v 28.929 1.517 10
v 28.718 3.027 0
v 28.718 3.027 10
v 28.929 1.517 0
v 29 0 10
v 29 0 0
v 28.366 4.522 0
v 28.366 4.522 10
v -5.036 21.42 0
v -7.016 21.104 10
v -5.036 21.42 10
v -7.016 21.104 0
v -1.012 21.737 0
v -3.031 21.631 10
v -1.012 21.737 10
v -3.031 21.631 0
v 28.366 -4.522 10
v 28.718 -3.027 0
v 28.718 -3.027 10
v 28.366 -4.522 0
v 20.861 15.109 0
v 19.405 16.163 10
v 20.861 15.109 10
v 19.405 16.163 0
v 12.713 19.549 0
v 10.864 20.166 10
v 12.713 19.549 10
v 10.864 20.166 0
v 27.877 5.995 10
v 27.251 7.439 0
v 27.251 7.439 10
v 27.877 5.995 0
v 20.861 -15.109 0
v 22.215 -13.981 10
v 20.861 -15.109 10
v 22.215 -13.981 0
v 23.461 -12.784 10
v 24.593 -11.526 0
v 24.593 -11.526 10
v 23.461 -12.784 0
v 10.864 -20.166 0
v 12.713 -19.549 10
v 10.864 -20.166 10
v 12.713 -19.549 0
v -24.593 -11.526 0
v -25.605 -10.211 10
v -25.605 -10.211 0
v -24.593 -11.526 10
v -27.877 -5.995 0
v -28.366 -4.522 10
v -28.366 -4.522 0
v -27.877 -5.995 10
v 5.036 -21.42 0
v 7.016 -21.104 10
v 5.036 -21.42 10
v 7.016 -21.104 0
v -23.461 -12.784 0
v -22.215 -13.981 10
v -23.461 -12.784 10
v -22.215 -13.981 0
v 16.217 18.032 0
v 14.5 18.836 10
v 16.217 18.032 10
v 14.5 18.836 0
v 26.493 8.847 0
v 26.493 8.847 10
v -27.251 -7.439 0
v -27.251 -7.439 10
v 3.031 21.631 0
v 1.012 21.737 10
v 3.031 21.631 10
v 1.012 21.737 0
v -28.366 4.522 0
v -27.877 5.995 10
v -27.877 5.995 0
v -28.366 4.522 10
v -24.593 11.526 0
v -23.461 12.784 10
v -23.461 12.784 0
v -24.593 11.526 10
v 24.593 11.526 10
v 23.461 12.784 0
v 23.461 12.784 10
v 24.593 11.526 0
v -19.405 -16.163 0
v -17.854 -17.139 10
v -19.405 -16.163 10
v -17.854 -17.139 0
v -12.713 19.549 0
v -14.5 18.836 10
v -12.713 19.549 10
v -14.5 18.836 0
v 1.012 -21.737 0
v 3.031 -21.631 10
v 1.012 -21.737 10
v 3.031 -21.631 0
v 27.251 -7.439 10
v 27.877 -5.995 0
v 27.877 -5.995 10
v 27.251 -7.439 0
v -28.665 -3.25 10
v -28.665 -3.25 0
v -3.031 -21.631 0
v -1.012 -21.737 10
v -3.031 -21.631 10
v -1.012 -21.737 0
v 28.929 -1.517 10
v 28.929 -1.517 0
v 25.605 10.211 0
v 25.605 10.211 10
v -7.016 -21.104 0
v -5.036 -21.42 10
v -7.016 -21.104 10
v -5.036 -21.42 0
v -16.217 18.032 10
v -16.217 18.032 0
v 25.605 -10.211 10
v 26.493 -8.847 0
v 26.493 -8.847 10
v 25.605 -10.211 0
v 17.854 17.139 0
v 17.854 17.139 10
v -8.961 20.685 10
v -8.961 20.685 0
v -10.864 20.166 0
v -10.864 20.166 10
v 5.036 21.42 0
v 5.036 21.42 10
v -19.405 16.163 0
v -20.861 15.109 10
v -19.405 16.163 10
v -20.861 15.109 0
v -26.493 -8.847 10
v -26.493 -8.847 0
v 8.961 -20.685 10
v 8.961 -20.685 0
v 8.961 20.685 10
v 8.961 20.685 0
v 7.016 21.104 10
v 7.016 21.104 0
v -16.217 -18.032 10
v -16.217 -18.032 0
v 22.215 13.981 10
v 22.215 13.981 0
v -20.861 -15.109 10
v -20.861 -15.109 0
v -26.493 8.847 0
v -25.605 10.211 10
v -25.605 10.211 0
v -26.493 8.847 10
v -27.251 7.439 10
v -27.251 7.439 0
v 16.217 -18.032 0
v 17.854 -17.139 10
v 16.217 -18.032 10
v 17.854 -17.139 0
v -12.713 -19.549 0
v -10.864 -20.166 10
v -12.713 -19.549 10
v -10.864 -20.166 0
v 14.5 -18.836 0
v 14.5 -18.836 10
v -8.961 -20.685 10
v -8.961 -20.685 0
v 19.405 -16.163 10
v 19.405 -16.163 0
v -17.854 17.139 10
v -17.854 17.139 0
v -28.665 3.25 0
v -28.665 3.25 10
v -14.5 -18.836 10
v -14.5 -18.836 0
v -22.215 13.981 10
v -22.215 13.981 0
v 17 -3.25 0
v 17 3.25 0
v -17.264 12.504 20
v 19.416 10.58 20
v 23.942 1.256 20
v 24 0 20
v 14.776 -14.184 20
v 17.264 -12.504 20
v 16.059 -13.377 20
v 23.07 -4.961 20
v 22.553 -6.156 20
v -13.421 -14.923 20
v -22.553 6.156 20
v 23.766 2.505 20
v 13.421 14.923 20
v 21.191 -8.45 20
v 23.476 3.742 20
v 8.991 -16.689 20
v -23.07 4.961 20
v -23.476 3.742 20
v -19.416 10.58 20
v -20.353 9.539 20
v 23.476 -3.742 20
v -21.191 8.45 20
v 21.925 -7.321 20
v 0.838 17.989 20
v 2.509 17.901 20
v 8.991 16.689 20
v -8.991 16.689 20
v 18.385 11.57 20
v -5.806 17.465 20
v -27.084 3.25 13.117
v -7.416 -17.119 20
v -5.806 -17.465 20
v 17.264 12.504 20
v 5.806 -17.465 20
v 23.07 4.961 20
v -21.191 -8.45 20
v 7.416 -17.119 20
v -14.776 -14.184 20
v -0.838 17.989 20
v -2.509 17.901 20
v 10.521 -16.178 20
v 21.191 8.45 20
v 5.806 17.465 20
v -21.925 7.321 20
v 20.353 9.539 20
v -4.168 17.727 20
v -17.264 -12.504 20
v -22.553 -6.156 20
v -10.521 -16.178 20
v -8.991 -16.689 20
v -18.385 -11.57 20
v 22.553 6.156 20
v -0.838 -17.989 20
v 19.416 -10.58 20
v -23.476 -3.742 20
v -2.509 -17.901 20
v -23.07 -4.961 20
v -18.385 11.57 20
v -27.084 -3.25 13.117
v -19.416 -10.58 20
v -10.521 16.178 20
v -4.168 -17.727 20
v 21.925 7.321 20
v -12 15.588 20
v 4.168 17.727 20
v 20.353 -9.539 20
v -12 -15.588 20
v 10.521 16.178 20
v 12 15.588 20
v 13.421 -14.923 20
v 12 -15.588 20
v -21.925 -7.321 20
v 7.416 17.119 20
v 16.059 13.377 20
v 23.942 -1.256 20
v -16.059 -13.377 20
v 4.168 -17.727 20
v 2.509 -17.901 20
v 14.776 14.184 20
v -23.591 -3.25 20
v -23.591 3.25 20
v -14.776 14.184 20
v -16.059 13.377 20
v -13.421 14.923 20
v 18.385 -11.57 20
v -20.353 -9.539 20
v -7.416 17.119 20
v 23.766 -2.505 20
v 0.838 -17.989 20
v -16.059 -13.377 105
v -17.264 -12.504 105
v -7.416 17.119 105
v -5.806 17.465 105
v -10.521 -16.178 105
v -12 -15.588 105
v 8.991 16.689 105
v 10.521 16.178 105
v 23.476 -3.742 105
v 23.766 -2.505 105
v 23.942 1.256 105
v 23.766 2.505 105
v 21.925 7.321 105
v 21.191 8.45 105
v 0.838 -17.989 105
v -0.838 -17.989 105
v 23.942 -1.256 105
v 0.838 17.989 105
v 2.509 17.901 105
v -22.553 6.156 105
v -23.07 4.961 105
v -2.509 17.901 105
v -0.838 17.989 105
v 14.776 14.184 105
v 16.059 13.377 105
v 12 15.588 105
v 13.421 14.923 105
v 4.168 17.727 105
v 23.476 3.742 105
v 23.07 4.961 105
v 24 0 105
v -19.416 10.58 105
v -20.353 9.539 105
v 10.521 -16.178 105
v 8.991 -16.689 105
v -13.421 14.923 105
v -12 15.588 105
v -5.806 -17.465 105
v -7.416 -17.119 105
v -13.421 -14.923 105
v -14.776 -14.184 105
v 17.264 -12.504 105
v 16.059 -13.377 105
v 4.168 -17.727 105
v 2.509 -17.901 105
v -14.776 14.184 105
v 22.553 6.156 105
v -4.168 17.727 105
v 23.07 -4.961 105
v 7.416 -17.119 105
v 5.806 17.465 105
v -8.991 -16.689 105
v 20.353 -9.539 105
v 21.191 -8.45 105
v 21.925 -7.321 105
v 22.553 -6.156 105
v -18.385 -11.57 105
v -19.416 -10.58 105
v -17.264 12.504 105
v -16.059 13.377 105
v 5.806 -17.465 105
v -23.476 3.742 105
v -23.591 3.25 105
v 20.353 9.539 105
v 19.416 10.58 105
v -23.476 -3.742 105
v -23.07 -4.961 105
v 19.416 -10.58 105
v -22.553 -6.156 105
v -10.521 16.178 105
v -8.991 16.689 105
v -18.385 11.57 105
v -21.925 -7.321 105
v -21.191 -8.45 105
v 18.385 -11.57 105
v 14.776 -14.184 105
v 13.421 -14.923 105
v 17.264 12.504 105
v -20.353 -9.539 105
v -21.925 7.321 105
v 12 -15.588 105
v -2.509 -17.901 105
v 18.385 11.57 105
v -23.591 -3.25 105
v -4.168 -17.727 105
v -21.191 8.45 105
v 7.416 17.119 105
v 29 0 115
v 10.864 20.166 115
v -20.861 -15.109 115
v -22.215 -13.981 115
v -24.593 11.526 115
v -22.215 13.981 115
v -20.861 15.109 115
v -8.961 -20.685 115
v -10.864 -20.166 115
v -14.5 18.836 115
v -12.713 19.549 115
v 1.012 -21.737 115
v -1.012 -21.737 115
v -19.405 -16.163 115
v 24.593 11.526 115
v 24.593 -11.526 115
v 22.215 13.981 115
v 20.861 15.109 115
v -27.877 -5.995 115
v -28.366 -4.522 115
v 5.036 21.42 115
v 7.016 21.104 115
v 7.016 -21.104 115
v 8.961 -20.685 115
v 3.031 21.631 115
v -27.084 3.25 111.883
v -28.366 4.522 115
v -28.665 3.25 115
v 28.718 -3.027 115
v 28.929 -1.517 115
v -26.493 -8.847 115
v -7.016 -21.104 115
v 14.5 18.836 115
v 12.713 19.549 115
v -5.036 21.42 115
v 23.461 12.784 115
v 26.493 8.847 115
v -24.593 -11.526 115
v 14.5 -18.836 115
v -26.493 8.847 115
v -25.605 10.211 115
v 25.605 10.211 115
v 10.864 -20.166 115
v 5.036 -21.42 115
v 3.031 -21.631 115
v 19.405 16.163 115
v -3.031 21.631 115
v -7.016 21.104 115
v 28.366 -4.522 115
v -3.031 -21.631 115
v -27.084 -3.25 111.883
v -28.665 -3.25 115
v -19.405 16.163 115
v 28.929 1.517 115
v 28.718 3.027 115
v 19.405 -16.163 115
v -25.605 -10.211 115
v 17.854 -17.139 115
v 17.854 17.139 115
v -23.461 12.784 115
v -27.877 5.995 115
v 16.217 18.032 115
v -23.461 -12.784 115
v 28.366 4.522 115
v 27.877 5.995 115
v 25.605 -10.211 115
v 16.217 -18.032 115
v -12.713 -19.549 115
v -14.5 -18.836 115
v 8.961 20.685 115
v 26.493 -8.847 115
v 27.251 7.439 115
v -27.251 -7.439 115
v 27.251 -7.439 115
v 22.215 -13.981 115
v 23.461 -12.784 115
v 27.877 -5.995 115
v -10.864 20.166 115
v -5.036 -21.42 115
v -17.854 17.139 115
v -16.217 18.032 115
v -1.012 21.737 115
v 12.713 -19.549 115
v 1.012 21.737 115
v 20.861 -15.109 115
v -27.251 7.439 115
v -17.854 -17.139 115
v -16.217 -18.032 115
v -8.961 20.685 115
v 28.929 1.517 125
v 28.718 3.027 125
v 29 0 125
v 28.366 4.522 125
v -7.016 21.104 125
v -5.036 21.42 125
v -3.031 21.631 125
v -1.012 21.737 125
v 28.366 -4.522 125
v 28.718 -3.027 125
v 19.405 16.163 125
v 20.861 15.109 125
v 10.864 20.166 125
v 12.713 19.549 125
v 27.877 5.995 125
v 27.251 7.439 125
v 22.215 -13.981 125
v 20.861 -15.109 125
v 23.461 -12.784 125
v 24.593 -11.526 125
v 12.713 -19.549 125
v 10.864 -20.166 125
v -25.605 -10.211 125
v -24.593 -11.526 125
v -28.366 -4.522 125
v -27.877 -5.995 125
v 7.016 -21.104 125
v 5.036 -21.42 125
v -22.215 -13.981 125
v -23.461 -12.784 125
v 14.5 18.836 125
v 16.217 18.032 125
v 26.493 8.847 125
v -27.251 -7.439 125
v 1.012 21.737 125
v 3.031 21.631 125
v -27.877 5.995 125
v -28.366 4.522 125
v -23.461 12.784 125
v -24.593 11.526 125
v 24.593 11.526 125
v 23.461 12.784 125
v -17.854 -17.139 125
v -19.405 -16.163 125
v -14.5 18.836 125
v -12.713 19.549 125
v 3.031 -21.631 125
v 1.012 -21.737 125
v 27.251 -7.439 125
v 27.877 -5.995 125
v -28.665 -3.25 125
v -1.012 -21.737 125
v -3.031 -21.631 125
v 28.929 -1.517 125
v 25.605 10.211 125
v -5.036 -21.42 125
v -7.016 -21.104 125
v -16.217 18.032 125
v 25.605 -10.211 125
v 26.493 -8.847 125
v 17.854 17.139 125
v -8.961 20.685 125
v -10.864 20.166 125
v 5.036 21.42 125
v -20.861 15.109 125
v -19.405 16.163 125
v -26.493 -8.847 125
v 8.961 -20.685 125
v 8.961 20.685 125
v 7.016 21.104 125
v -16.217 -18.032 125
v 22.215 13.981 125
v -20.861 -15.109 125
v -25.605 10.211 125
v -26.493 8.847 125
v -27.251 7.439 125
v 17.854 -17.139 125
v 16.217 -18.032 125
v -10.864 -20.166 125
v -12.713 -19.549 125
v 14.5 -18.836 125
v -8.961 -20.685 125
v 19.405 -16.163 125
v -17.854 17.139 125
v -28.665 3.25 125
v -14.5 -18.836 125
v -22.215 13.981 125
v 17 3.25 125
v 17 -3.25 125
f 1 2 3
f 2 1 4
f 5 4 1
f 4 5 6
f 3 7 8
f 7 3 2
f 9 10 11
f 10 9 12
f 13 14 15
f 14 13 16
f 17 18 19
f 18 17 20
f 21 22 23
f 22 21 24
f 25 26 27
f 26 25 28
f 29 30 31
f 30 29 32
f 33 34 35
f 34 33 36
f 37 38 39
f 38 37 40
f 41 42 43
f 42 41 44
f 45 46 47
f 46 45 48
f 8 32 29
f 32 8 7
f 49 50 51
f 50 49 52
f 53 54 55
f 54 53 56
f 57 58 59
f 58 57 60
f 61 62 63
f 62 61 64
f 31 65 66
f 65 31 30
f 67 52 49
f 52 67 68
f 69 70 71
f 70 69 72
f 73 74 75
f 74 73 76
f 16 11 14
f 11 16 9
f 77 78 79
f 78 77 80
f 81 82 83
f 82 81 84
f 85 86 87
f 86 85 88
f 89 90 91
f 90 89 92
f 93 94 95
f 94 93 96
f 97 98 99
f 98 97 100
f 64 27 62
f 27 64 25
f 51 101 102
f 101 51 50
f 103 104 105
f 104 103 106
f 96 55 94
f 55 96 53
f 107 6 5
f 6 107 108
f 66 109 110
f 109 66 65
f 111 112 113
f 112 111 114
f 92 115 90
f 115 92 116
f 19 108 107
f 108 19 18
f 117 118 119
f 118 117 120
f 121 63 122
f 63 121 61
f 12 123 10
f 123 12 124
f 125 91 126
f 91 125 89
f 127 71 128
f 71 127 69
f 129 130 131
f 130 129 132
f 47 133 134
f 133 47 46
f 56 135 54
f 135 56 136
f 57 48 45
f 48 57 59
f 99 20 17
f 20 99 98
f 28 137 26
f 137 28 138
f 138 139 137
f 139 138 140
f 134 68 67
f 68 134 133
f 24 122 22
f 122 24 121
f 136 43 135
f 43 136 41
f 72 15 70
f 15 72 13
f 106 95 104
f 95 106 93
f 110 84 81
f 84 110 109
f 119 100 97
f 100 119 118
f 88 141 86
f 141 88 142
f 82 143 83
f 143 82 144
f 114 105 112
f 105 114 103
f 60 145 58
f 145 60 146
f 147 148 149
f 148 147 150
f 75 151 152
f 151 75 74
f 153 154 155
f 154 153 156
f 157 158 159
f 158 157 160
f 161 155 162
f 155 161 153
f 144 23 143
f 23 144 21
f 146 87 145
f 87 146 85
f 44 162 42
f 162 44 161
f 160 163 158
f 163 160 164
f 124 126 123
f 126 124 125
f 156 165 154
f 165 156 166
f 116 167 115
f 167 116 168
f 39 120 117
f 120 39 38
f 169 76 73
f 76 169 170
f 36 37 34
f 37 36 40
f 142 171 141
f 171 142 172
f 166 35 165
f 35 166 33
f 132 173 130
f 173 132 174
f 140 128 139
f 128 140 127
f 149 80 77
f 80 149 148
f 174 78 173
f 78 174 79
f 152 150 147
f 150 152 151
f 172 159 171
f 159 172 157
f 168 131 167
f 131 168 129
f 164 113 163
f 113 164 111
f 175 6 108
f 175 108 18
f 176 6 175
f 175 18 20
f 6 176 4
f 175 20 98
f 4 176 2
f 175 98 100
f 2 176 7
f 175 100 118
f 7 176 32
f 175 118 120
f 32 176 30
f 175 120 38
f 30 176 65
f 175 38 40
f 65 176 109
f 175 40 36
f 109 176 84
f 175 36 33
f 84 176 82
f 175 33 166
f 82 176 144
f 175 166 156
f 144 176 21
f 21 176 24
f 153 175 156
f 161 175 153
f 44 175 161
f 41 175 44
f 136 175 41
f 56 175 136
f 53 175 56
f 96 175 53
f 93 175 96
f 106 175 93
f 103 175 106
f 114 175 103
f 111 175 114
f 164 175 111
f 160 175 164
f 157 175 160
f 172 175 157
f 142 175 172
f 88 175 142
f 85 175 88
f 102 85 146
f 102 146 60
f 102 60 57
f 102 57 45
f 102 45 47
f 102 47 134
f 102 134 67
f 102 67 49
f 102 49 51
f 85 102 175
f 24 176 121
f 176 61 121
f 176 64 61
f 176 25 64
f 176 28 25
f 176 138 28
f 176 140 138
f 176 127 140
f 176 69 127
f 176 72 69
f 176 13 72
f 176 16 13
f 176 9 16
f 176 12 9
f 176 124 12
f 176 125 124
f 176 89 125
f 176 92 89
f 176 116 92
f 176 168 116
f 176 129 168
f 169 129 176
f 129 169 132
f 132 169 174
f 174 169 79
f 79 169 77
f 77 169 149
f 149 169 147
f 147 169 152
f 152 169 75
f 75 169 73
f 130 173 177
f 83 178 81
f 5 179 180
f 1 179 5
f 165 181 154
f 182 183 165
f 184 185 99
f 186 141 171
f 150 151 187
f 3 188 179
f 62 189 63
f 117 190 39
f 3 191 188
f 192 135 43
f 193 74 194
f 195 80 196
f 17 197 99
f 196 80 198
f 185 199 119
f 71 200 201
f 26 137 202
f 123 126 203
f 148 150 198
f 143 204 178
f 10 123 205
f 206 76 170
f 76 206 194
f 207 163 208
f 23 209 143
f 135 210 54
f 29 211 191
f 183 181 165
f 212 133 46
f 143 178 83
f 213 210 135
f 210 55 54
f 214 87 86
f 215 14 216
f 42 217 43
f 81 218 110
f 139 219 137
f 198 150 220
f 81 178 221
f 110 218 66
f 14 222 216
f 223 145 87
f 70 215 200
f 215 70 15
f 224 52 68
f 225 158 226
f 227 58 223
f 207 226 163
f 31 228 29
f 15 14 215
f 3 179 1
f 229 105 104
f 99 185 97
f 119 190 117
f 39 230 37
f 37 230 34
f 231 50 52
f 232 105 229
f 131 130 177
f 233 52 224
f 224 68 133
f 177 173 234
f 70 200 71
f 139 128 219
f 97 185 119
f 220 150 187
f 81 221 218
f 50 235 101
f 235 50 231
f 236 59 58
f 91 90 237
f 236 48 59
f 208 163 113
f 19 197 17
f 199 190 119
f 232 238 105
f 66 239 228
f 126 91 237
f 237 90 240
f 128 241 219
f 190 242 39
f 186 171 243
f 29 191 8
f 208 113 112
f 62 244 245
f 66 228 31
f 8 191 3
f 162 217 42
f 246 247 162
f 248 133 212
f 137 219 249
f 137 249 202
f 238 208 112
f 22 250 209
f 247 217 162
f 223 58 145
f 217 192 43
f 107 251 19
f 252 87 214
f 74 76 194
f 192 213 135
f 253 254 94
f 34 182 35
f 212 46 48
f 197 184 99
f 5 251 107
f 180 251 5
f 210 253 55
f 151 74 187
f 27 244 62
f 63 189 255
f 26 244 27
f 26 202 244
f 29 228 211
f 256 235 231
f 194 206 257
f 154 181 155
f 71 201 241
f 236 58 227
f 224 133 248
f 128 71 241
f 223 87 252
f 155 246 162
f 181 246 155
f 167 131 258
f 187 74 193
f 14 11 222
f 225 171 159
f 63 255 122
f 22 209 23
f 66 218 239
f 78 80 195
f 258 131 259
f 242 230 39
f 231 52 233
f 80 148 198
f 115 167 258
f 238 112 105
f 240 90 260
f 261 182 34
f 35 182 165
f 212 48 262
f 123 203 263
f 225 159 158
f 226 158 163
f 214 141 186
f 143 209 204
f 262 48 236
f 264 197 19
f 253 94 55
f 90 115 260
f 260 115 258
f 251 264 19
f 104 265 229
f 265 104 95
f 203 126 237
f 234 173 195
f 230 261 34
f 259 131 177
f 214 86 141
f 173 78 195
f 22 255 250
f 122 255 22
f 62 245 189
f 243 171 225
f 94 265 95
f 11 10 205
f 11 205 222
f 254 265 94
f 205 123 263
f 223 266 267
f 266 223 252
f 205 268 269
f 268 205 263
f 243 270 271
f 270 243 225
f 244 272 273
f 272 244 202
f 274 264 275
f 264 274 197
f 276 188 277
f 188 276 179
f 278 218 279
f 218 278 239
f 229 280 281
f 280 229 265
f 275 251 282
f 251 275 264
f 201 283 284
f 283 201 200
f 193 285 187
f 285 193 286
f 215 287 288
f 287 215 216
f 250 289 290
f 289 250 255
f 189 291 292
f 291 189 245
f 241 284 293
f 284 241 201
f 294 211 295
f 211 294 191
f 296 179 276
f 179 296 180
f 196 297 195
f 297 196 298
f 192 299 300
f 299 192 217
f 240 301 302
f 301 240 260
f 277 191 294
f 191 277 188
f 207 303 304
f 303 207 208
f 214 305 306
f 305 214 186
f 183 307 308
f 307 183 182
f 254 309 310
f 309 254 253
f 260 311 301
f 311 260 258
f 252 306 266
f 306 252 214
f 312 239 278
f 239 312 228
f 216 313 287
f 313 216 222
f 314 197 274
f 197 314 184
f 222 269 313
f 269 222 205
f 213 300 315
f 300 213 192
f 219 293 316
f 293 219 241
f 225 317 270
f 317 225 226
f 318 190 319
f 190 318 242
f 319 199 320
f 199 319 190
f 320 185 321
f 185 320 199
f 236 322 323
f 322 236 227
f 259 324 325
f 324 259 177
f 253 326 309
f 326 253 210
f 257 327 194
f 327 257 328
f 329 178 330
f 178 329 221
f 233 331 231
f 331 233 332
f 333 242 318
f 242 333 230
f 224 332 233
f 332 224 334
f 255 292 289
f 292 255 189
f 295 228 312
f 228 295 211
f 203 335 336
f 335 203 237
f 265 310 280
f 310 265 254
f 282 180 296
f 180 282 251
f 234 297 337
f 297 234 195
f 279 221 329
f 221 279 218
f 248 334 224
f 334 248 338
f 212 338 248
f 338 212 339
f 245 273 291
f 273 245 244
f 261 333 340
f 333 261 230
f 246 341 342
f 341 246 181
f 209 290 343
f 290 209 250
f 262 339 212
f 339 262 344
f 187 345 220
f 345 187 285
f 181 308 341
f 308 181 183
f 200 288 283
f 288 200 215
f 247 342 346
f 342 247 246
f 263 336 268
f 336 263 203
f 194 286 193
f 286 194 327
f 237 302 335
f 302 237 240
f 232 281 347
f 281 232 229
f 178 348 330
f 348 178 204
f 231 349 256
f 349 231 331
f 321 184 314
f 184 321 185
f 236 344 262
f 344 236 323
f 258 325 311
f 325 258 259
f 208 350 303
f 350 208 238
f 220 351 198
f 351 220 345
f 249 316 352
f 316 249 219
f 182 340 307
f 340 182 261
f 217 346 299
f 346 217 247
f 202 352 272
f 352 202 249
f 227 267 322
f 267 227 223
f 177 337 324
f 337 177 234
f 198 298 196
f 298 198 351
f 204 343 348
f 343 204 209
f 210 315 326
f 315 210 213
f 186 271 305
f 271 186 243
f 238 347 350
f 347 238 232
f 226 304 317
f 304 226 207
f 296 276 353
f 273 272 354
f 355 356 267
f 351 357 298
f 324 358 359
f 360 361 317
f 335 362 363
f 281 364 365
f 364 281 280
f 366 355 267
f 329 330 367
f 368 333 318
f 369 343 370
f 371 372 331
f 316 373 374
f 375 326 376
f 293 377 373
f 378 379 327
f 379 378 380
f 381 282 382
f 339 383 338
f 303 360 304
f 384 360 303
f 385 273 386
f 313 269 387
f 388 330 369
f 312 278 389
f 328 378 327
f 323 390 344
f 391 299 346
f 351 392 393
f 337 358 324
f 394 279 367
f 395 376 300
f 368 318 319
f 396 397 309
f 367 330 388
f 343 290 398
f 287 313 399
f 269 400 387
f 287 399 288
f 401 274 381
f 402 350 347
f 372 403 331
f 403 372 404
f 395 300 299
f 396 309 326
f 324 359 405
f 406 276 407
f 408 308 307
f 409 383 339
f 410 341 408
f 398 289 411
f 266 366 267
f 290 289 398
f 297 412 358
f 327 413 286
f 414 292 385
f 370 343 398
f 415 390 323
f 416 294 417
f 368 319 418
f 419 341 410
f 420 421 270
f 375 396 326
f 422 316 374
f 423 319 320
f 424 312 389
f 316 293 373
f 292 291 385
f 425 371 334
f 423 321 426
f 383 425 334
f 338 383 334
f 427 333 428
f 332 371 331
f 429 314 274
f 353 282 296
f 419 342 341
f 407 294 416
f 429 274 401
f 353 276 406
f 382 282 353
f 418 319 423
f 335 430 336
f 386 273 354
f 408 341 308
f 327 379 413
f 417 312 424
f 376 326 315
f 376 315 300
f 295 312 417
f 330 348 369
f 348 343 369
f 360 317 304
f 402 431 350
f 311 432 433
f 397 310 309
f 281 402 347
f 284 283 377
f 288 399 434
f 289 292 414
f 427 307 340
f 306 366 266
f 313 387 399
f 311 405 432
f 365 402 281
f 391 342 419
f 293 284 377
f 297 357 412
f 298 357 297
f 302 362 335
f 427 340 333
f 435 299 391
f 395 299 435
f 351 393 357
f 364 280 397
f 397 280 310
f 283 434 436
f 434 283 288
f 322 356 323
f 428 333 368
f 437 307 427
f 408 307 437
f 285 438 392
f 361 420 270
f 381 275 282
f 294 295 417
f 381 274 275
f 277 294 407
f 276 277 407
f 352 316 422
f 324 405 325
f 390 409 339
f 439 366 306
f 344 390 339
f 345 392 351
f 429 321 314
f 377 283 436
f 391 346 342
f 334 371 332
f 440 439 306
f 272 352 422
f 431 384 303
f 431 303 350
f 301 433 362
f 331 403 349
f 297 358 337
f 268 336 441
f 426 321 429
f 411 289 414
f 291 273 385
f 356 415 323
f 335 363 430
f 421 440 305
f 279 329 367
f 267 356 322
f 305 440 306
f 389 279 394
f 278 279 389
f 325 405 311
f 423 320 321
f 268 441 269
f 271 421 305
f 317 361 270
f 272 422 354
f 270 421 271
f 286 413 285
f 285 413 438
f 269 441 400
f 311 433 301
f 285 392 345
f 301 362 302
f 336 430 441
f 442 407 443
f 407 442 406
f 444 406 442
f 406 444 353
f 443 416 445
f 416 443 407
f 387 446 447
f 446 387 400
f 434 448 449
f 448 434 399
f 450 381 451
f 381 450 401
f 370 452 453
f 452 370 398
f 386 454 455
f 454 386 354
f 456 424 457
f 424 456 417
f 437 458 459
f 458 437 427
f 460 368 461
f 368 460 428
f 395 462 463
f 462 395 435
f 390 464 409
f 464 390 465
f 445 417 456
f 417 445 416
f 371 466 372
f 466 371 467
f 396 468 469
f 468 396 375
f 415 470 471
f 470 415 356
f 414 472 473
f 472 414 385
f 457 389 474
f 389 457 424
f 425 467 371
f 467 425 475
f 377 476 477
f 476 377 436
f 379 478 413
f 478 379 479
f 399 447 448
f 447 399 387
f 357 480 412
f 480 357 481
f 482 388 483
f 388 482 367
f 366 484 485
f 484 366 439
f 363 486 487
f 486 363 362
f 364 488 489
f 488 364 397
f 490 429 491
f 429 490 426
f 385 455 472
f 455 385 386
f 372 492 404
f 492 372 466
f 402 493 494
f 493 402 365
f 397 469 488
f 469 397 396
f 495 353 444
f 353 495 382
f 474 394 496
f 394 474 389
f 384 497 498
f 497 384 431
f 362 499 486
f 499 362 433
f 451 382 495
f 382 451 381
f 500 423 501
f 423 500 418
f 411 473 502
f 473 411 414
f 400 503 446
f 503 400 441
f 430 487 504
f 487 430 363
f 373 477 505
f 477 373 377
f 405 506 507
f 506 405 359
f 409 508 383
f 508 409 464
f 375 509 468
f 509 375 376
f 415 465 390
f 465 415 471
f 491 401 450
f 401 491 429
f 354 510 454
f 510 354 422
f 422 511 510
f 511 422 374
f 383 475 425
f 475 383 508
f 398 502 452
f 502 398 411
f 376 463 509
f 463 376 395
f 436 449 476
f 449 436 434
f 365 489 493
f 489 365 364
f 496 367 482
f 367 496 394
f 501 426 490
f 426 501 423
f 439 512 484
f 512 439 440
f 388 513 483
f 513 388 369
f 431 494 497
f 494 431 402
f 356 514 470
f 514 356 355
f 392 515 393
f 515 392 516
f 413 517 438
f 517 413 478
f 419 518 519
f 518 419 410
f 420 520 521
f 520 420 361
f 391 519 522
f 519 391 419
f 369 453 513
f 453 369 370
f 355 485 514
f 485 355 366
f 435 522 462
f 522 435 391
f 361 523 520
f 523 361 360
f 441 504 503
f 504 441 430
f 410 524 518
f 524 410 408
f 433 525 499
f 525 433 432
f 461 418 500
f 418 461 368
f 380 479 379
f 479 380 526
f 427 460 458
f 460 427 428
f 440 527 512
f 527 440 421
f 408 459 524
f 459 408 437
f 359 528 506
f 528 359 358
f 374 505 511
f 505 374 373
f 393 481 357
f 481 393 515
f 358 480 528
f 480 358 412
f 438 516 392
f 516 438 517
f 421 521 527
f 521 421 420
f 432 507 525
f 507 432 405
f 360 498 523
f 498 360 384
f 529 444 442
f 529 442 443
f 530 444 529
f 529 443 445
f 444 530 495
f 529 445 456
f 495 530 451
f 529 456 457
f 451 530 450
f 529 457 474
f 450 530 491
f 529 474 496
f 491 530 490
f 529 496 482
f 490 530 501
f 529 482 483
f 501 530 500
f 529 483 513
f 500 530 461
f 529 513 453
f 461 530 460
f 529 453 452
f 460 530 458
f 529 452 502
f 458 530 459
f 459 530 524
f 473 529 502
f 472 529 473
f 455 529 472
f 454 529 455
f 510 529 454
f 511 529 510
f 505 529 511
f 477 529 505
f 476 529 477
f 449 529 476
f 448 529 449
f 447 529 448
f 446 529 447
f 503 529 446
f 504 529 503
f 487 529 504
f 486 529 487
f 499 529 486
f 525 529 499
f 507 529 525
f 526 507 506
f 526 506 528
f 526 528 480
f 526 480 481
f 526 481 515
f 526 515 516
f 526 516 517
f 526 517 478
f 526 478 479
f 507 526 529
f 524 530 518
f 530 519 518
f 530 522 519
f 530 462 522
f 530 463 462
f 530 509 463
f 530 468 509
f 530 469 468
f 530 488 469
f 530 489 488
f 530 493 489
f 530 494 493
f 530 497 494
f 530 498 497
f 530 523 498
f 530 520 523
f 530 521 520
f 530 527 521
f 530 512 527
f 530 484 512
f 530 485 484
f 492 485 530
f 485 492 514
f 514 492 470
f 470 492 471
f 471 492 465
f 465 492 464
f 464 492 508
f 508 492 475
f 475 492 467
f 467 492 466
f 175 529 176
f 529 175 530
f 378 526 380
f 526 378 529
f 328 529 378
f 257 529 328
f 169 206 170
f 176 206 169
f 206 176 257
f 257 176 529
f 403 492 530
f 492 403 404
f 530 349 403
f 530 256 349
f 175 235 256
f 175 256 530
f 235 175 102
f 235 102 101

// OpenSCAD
eps = 0.01;
$fn = 90;

// Prusa frame praters
// frame height
f_h = 41;
// frame thickness
f_t = 6.5;

// handle parameter
// handle lenght
h_l = 85;
// handle diameter
h_d = f_h+7;

// stoppers paramters
s_p = 10;
s_D = h_d + s_p;
s_l = s_p;

module handle()
{
    difference()
    {
        // handle
        scale([1,0.75,1])
        union()
        {
            cylinder(d=s_D, h=s_l);
            translate([0,0,s_l])
                cylinder(d1=s_D, d2=h_d, h=s_l);
            translate([0,0,2*s_l])
                cylinder(d=h_d, h=h_l);
            translate([0,0,2*s_l+h_l])
                cylinder(d1=h_d, d2=s_D, h=s_l);
            translate([0,0,3*s_l+h_l])
                cylinder(d=s_D, h=s_l);
        }
        
        // frame cut
        _c_l = h_l+4*s_l;
        translate([-h_d/2-s_p-eps,-f_t/2,-eps])
            cube([f_h+eps+s_p,f_t,_c_l+2*eps]);
        
        
    }
}

handle();
